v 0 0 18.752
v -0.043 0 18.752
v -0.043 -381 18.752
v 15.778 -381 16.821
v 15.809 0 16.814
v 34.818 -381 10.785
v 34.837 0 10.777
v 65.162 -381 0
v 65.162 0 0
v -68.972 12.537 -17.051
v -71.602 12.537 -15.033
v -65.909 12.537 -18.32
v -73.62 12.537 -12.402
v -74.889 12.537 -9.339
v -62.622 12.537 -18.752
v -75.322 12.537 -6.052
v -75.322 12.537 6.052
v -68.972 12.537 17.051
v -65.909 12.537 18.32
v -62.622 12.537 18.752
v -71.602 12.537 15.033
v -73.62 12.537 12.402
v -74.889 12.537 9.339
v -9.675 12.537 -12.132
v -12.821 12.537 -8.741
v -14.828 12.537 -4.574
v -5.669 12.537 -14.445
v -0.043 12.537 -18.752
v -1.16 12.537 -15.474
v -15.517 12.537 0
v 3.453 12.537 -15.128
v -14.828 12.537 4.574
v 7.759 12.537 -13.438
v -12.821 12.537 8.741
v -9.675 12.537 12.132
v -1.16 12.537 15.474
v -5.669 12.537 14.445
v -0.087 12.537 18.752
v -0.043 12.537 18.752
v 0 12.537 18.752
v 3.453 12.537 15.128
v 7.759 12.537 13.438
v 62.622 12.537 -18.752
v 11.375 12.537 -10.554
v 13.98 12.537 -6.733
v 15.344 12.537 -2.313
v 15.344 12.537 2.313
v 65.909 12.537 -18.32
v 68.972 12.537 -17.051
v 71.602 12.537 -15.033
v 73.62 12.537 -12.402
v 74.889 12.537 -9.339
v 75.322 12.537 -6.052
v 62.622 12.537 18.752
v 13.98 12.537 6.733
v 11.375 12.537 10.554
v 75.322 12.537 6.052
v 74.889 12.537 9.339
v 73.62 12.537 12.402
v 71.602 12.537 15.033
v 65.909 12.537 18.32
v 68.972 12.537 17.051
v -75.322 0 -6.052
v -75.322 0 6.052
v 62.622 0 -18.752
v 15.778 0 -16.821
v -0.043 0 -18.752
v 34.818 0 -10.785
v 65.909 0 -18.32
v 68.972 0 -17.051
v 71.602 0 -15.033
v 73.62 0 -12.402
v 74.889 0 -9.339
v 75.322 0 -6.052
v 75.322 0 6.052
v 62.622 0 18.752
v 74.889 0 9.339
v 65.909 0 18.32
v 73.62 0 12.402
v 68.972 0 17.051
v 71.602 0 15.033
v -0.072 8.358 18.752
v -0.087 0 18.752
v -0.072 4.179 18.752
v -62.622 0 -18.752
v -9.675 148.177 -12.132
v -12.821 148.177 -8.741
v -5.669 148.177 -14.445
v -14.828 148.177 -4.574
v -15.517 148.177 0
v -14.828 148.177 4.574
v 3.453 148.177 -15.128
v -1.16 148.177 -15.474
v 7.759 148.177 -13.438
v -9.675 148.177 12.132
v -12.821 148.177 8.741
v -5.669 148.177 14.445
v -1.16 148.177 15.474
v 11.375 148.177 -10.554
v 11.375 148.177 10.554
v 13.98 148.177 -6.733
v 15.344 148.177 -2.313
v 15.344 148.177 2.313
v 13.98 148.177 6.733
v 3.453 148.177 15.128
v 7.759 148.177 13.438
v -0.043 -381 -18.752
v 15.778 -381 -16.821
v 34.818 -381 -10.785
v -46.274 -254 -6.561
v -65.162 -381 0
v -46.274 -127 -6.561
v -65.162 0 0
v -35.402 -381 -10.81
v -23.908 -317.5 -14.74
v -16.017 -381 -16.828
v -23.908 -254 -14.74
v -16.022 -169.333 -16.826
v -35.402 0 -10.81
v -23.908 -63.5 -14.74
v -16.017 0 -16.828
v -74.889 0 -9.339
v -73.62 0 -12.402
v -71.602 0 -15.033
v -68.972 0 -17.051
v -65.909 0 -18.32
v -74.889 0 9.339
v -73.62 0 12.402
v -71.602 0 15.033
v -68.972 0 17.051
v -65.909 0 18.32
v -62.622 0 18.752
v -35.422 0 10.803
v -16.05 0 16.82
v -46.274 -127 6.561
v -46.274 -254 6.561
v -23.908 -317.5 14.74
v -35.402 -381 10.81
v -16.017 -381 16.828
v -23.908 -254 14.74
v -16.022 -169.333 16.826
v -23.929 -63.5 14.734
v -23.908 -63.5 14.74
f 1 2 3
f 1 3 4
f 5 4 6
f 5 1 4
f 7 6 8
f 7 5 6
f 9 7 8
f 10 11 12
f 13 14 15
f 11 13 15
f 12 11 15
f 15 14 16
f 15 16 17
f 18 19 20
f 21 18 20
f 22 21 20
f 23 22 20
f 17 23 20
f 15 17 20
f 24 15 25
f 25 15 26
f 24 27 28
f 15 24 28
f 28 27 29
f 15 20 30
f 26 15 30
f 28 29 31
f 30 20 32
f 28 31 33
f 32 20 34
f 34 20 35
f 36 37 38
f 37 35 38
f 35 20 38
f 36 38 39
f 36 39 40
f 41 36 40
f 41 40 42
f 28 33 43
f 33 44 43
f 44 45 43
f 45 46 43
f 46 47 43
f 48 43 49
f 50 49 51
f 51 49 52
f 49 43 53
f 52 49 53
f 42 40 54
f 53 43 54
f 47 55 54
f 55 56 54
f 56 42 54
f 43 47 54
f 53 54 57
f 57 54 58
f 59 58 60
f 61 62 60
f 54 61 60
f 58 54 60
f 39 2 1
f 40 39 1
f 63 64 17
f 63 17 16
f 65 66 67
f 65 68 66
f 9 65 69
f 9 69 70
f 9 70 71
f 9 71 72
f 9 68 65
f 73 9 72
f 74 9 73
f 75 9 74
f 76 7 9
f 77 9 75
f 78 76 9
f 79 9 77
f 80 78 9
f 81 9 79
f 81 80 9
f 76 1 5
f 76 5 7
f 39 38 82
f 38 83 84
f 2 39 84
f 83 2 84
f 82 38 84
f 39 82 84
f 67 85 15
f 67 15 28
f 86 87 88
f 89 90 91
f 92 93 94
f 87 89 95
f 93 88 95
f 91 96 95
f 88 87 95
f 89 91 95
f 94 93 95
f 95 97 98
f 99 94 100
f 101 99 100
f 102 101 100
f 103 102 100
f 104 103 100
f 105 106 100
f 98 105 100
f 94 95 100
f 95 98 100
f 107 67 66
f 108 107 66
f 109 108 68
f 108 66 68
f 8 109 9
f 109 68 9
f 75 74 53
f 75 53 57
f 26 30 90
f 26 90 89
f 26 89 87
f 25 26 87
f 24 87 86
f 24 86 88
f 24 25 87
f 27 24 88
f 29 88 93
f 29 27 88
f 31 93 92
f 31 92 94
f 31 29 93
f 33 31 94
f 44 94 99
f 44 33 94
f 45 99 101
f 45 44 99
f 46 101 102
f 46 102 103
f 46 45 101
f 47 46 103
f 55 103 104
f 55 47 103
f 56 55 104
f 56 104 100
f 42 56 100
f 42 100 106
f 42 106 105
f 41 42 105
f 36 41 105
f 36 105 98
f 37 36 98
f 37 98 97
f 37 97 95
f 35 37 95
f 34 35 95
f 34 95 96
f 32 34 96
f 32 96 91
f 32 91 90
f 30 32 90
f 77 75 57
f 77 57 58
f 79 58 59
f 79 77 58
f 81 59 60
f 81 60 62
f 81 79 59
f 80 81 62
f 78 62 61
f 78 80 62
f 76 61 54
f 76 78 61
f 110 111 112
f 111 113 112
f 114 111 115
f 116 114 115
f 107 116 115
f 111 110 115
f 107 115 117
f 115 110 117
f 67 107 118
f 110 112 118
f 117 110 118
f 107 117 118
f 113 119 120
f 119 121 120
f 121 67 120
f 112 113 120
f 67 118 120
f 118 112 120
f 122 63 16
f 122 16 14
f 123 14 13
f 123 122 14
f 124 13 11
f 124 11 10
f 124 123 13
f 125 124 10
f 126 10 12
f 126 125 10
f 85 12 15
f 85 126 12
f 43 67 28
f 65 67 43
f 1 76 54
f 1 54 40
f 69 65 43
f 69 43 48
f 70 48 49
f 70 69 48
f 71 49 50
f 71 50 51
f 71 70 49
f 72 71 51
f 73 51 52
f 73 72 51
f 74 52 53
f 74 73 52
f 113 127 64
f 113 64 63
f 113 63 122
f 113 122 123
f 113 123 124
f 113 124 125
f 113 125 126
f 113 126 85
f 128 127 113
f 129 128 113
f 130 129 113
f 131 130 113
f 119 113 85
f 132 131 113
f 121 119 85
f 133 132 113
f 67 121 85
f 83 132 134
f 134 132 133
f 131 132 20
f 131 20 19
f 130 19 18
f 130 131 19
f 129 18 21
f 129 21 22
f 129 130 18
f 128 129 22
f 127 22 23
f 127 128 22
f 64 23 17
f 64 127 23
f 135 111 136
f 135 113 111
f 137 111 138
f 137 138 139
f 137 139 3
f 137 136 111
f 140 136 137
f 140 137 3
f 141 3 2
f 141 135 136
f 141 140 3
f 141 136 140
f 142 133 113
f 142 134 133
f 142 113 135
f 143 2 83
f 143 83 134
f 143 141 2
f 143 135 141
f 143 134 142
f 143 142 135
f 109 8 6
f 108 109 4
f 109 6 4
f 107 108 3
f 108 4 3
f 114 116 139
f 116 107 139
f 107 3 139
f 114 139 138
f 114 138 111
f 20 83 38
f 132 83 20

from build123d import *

# Parameters (mm, degrees)
F1_DEPTH = 12.53708
F2_DEPTH = 148.17746
F3_DEPTH = 381


# Not quite as in the source:
# - ends of sketch curves that miss each other by under 0.0002 mm in the source are joined
# - a feature names something its author has since deleted; it is built from what else it names


with BuildPart() as f1:
    # F0 (on Front) → F1 (new body)
    with BuildSketch(Plane.XZ):
        with BuildLine():
            Line((-0.0432951165, 18.7523439527), (-62.6219127655, 18.7523439527))
            ThreePointArc((-62.6219127655, 18.7523439527), (-71.6021688866, 15.0326000737), (-75.3219127655, 6.0523439527))
            Line((-75.3219127655, 6.0523439527), (-75.3219127655, 0))
            Line((-75.3219127655, 0), (-65.1619127655, 0))
            add(Edge.make_bspline(
                [(-65.1619127655, 0), (-48.671609143, 3.823998258), (-23.9979293543, 18.7523570586), (-0.0432951165, 18.7523439527)],
                knots=[0, 0, 0, 0, 0.499698946, 0.499698946, 0.499698946, 0.499698946], degree=3))
        make_face()
        with BuildLine():
            add(Edge.make_bspline(
                [(-0.0432951165, 18.7523602083), (-0.0288631494, 18.7523602102), (23.9542012968, 18.7433586286), (47.2111099504, 3.7542823594), (65.1619127655, 0)],
                knots=[0.499698946, 0.499698946, 0.499698946, 0.499698946, 0.5, 1, 1, 1, 1], degree=3))
            add(Edge.make_bspline(
                [(-65.1619127655, 0), (-48.671609143, 3.823998258), (-23.9979293543, 18.7523570586), (-0.0432951165, 18.7523602083)],
                knots=[0, 0, 0, 0, 0.499698946, 0.499698946, 0.499698946, 0.499698946], degree=3))
            Line((-65.1619127655, 0), (-15.5171778125, 0))
            ThreePointArc((-15.5171778125, 0), (0, 15.5171778125), (15.5171778125, 0))
            Line((15.5171778125, 0), (65.1619127655, 0))
        make_face()
        with BuildLine():
            Line((62.6219127655, 18.7523439527), (-0.0432951165, 18.7523439527))
            add(Edge.make_bspline(
                [(-0.0432951165, 18.7523439527), (-0.0288631494, 18.7523602102), (23.9542012968, 18.7433586286), (47.2111099504, 3.7542823594), (65.1619127655, 0)],
                knots=[0.499698946, 0.499698946, 0.499698946, 0.499698946, 0.5, 1, 1, 1, 1], degree=3))
            Line((65.1619127655, 0), (75.3219127655, 0))
            Line((75.3219127655, 0), (75.3219127655, 6.0523439527))
            ThreePointArc((75.3219127655, 6.0523439527), (71.6021688866, 15.0326000737), (62.6219127655, 18.7523439527))
        make_face()
        with BuildLine():
            add(Edge.make_bspline(
                [(-65.1619127655, 0), (-48.671609143, -3.823998258), (-23.9979293543, -18.7523570586), (-0.0432951165, -18.7523602083)],
                knots=[0, 0, 0, 0, 0.499698946, 0.499698946, 0.499698946, 0.499698946], degree=3))
            Line((-65.1619127655, 0), (-75.3219127655, 0))
            Line((-75.3219127655, 0), (-75.3219127655, -6.0523439527))
            ThreePointArc((-75.3219127655, -6.0523439527), (-71.6021688866, -15.0326000737), (-62.6219127655, -18.7523439527))
            Line((-62.6219127655, -18.7523439527), (-0.0432951165, -18.7523602083))
        make_face()
        with BuildLine():
            Line((-15.5171778125, 0), (-65.1619127655, 0))
            add(Edge.make_bspline(
                [(-65.1619127655, 0), (-48.671609143, -3.823998258), (-23.9979293543, -18.7523570586), (-0.0432951165, -18.7523602083)],
                knots=[0, 0, 0, 0, 0.499698946, 0.499698946, 0.499698946, 0.499698946], degree=3))
            add(Edge.make_bspline(
                [(-0.0432951165, -18.7523602083), (-0.0288631494, -18.7523602102), (23.9542012968, -18.7433586286), (47.2111099504, -3.7542823594), (65.1619127655, 0)],
                knots=[0.499698946, 0.499698946, 0.499698946, 0.499698946, 0.5, 1, 1, 1, 1], degree=3))
            Line((65.1619127655, 0), (15.5171778125, 0))
            ThreePointArc((15.5171778125, 0), (0, -15.5171778125), (-15.5171778125, 0))
        make_face()
        with BuildLine():
            Line((75.3219127655, 0), (65.1619127655, 0))
            add(Edge.make_bspline(
                [(-0.0432951165, -18.7523602083), (-0.0288631494, -18.7523602102), (23.9542012968, -18.7433586286), (47.2111099504, -3.7542823594), (65.1619127655, 0)],
                knots=[0.499698946, 0.499698946, 0.499698946, 0.499698946, 0.5, 1, 1, 1, 1], degree=3))
            Line((-0.0432951165, -18.7523602083), (62.6219127655, -18.7523439527))
            ThreePointArc((62.6219127655, -18.7523439527), (71.6021688866, -15.0326000737), (75.3219127655, -6.0523439527))
            Line((75.3219127655, -6.0523439527), (75.3219127655, 0))
        make_face()
        with BuildLine():
            ThreePointArc((15.5171778125, 0), (0, 15.5171778125), (-15.5171778125, 0))
            ThreePointArc((-15.5171778125, 0), (0, -15.5171778125), (15.5171778125, 0))
        make_face()
    extrude(amount=-F1_DEPTH)

    # F0 (on Front) → F2 (join)
    with BuildSketch(Plane.XZ):
        with BuildLine():
            ThreePointArc((15.5171778125, 0), (0, 15.5171778125), (-15.5171778125, 0))
            ThreePointArc((-15.5171778125, 0), (0, -15.5171778125), (15.5171778125, 0))
        make_face()
    extrude(amount=-F2_DEPTH)

    # F0 (on Front) → F3 (join)
    with BuildSketch(Plane.XZ):
        with BuildLine():
            add(Edge.make_bspline(
                [(-0.0432951165, 18.7523602083), (-0.0288631494, 18.7523602102), (23.9542012968, 18.7433586286), (47.2111099504, 3.7542823594), (65.1619127655, 0)],
                knots=[0.499698946, 0.499698946, 0.499698946, 0.499698946, 0.5, 1, 1, 1, 1], degree=3))
            add(Edge.make_bspline(
                [(-65.1619127655, 0), (-48.671609143, 3.823998258), (-23.9979293543, 18.7523570586), (-0.0432951165, 18.7523602083)],
                knots=[0, 0, 0, 0, 0.499698946, 0.499698946, 0.499698946, 0.499698946], degree=3))
            Line((-65.1619127655, 0), (-15.5171778125, 0))
            ThreePointArc((-15.5171778125, 0), (0, 15.5171778125), (15.5171778125, 0))
            Line((15.5171778125, 0), (65.1619127655, 0))
        make_face()
        with BuildLine():
            Line((-15.5171778125, 0), (-65.1619127655, 0))
            add(Edge.make_bspline(
                [(-65.1619127655, 0), (-48.671609143, -3.823998258), (-23.9979293543, -18.7523570586), (-0.0432951165, -18.7523602083)],
                knots=[0, 0, 0, 0, 0.499698946, 0.499698946, 0.499698946, 0.499698946], degree=3))
            add(Edge.make_bspline(
                [(-0.0432951165, -18.7523602083), (-0.0288631494, -18.7523602102), (23.9542012968, -18.7433586286), (47.2111099504, -3.7542823594), (65.1619127655, 0)],
                knots=[0.499698946, 0.499698946, 0.499698946, 0.499698946, 0.5, 1, 1, 1, 1], degree=3))
            Line((65.1619127655, 0), (15.5171778125, 0))
            ThreePointArc((15.5171778125, 0), (0, -15.5171778125), (-15.5171778125, 0))
        make_face()
        with BuildLine():
            ThreePointArc((15.5171778125, 0), (0, 15.5171778125), (-15.5171778125, 0))
            ThreePointArc((-15.5171778125, 0), (0, -15.5171778125), (15.5171778125, 0))
        make_face()
    extrude(amount=F3_DEPTH)


solid = f1.part
